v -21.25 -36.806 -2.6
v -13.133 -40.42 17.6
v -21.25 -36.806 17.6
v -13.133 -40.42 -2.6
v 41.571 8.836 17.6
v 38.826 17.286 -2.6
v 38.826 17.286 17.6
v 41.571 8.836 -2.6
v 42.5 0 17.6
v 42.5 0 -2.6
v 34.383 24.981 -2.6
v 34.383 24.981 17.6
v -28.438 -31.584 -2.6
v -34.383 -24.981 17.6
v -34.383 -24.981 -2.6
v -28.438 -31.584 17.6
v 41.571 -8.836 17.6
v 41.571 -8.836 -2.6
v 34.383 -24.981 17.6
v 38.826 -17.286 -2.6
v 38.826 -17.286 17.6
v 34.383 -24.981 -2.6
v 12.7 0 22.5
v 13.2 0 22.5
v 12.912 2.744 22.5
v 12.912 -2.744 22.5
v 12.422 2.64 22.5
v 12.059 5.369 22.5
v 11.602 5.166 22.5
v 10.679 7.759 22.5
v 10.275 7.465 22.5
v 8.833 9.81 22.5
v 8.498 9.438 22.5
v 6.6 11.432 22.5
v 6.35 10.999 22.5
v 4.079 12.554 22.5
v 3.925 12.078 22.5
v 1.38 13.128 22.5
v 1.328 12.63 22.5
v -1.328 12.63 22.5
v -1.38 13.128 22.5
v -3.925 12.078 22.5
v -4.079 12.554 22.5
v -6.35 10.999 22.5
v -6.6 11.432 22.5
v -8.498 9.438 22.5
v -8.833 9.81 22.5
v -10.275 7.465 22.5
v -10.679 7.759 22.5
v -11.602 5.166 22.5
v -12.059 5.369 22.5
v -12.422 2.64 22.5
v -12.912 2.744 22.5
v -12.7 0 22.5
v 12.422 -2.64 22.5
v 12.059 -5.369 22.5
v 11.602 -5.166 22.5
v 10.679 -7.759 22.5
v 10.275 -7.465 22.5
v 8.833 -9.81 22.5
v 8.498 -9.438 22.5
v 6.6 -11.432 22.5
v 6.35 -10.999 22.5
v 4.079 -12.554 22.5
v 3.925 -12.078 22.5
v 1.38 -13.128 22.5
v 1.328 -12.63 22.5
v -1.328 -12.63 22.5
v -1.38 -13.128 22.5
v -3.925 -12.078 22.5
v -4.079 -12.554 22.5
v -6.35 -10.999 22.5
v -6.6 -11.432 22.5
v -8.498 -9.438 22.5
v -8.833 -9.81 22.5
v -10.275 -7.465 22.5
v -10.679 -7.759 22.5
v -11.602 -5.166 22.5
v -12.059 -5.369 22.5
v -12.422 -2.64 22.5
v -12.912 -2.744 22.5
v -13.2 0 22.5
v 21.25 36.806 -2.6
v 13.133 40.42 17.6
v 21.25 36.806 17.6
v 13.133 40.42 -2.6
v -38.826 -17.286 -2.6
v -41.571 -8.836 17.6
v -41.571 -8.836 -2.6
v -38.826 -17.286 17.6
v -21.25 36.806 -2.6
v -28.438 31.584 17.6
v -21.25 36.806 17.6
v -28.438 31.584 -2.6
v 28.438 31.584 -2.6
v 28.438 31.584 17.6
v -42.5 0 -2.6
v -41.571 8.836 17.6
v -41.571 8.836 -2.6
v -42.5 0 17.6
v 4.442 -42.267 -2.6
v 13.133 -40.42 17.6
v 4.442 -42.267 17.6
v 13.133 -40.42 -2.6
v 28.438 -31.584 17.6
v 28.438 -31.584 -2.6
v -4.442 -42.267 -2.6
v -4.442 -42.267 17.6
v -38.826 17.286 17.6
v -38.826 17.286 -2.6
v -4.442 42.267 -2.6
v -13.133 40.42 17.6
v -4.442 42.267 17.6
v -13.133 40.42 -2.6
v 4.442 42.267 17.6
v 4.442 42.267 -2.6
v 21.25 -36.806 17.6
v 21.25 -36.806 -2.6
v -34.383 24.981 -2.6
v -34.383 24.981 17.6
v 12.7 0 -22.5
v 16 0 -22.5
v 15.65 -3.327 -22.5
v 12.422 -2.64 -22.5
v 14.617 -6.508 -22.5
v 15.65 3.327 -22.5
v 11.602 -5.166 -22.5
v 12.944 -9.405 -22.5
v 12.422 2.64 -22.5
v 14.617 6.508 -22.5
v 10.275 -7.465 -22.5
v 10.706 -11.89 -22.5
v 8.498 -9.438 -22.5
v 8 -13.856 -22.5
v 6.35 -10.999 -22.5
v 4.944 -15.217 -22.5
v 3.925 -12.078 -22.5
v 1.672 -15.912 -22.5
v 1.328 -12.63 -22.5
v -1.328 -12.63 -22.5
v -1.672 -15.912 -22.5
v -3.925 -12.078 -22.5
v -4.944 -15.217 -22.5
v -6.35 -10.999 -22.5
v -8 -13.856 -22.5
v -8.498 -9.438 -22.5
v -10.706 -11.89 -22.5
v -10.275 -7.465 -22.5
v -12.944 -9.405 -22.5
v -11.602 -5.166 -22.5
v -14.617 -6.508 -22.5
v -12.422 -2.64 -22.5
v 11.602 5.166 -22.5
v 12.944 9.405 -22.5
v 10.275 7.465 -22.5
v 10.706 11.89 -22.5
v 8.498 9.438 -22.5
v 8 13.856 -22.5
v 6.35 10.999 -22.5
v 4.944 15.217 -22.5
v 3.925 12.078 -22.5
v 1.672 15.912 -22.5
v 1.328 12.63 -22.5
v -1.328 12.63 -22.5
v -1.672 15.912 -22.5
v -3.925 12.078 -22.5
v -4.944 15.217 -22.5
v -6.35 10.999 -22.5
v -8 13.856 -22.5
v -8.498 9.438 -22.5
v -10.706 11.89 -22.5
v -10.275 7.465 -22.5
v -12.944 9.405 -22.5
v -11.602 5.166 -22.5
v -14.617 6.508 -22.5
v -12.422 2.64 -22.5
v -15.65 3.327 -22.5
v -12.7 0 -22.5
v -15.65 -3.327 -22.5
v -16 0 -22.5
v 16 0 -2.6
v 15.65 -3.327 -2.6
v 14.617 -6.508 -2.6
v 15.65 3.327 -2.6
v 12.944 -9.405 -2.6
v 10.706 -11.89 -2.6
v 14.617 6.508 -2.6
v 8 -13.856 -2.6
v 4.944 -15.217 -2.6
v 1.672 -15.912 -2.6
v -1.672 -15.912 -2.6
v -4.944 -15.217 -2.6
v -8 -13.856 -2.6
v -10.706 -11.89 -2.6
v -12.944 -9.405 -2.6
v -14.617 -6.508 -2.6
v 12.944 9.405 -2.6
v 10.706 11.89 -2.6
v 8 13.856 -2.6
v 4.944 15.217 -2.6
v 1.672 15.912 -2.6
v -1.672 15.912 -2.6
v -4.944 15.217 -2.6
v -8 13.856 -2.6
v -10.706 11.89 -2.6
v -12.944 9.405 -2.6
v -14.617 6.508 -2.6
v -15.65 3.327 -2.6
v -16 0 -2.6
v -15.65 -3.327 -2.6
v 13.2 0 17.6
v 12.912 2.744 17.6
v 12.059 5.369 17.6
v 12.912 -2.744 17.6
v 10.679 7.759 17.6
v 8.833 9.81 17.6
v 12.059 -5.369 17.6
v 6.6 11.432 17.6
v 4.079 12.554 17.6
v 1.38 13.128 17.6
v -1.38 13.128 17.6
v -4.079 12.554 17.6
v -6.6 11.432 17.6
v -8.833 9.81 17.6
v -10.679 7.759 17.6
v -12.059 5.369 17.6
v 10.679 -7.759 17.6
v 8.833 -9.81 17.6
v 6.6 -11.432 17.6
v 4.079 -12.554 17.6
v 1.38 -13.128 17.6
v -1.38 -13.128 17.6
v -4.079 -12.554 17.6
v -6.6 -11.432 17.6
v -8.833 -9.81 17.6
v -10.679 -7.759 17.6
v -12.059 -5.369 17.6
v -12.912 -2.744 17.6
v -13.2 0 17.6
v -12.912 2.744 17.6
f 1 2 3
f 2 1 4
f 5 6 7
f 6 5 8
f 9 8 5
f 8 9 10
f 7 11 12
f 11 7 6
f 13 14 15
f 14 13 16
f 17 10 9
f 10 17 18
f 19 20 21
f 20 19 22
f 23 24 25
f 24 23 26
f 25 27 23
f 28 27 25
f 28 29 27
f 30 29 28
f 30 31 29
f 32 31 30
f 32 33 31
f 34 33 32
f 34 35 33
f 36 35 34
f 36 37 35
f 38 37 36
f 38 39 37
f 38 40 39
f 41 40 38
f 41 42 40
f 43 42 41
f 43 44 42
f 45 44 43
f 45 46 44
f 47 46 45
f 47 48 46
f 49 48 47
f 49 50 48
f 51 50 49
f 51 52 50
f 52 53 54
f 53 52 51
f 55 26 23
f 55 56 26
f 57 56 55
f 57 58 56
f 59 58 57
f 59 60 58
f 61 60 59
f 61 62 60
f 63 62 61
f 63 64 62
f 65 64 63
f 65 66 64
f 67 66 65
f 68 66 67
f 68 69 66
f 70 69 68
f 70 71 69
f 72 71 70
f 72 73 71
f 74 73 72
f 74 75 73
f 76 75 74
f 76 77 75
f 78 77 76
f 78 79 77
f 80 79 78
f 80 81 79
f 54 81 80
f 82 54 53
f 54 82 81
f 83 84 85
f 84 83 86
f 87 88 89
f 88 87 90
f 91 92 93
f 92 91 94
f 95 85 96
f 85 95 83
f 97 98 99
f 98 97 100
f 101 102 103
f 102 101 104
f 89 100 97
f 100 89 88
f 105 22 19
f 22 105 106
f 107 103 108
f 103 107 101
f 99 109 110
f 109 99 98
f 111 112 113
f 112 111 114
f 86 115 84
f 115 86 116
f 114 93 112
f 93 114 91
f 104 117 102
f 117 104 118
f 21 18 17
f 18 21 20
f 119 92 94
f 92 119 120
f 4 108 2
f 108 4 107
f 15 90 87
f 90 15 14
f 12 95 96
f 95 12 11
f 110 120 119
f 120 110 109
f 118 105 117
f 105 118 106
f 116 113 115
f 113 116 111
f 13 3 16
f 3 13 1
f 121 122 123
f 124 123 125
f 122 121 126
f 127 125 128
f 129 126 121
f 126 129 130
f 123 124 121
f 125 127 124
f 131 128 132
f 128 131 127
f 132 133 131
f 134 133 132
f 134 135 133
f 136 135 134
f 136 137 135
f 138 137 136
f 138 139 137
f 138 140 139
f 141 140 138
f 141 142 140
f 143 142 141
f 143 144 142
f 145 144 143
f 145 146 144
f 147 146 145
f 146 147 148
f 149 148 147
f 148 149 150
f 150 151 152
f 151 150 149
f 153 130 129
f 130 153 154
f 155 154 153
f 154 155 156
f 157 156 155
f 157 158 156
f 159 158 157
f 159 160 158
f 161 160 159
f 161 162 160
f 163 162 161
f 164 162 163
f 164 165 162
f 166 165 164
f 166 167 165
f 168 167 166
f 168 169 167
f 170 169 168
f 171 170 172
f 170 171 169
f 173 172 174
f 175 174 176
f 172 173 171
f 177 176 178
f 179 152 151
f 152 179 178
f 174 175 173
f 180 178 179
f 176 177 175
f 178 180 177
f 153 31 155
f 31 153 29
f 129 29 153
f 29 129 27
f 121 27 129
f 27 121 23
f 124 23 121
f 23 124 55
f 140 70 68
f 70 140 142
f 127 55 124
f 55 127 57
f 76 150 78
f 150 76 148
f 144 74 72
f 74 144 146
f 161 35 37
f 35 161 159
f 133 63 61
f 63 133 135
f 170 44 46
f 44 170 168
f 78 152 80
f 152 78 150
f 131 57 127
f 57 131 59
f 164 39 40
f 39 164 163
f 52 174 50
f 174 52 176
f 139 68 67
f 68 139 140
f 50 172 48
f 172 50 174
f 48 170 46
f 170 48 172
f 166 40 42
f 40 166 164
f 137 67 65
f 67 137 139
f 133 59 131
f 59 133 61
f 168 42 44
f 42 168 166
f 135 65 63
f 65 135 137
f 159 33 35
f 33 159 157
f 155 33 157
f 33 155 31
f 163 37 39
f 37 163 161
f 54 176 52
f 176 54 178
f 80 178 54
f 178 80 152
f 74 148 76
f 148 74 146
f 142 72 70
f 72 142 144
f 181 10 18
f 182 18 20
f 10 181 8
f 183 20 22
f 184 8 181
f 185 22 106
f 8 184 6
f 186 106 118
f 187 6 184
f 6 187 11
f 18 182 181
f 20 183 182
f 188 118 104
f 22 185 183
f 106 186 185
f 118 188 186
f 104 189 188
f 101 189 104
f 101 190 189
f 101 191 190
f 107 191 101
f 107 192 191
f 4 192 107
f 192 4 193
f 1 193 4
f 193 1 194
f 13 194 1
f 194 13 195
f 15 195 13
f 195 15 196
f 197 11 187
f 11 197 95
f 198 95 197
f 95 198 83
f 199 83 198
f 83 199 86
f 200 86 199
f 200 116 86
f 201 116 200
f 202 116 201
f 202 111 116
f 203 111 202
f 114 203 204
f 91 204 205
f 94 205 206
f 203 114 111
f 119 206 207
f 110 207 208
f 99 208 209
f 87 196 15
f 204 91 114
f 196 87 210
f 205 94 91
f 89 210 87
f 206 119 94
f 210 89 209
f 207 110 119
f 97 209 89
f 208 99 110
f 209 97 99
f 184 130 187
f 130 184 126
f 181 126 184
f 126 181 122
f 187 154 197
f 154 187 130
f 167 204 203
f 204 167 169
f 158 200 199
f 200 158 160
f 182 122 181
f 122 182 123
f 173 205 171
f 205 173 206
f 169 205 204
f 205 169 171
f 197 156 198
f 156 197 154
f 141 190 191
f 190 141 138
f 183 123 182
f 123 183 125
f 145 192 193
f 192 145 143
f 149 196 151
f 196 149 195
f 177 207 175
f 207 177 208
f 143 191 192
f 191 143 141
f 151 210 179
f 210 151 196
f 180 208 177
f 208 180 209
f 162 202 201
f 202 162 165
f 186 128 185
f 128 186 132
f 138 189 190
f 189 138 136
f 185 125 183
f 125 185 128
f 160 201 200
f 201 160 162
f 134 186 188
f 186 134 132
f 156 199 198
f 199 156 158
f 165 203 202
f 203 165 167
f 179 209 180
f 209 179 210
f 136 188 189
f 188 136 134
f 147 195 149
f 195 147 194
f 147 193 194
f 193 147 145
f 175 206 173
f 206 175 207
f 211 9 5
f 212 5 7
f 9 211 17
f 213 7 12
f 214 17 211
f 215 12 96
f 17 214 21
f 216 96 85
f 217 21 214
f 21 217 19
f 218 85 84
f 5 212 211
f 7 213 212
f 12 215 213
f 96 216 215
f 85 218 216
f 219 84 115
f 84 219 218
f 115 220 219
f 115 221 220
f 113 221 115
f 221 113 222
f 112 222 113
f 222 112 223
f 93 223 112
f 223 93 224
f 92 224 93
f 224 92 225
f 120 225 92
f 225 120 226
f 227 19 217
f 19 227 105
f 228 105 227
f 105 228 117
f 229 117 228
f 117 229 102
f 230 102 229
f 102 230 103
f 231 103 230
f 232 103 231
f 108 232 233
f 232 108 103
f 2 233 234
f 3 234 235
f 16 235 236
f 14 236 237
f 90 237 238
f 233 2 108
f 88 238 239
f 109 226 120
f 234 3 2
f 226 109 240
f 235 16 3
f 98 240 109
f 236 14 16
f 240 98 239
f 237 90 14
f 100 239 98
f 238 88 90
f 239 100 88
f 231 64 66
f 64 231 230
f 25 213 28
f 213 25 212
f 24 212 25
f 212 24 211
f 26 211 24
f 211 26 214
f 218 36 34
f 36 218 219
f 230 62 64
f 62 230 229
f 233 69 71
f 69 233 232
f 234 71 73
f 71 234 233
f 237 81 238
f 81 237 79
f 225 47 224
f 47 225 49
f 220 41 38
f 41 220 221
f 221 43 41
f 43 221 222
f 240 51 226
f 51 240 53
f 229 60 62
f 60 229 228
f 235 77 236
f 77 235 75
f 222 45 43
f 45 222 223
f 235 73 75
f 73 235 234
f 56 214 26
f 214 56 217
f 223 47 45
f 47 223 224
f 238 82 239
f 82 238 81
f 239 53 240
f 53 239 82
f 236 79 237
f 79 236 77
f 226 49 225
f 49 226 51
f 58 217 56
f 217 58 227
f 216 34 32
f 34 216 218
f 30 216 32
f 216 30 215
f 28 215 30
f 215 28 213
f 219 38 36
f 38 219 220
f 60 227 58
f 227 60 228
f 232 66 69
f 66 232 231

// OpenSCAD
total_len=45;
diam_ex1 = 85;
diam_ex2 = 32;
diam_ex3 = 25.4+1;
diametro_interior = 25.4;
diametro_cabeza_chicote = 5;
profundidad_ranura_chic = 2;
l1=20;
l3=5;

radio_interior = diametro_interior / 2;
radio_ex1 = diam_ex1 / 2;
radio_ex2 = diam_ex2 / 2;
radio_ex3 = diam_ex3 / 2;

module barra_hueca() {
    difference() {
        cylinder(h=total_len,   r=radio_ex1, center=true);
        cylinder(h=total_len+0.1, r=radio_interior, center=true);
    }
}

module barra_hueca_cilindrada1() {
    translate([0,0,-0.1-(total_len/2)+(l1/2)])
    difference() {
        cylinder(h=l1,   r=radio_ex1+0.1, center=true);
        cylinder(h=l1+0.1, r=radio_ex2, center=true);
    }
}

module barra_hueca_cilindrada2() {
    translate([0,0,+0.1+(total_len/2)-(l3/2)])
    difference() {
        cylinder(h=l3,   r=radio_ex1+0.1, center=true);
        cylinder(h=l3+0.1, r=radio_ex3, center=true);
    }
}

module all() {
    difference(){
       barra_hueca();
       barra_hueca_cilindrada1();
       barra_hueca_cilindrada2();
    }
}

all();
